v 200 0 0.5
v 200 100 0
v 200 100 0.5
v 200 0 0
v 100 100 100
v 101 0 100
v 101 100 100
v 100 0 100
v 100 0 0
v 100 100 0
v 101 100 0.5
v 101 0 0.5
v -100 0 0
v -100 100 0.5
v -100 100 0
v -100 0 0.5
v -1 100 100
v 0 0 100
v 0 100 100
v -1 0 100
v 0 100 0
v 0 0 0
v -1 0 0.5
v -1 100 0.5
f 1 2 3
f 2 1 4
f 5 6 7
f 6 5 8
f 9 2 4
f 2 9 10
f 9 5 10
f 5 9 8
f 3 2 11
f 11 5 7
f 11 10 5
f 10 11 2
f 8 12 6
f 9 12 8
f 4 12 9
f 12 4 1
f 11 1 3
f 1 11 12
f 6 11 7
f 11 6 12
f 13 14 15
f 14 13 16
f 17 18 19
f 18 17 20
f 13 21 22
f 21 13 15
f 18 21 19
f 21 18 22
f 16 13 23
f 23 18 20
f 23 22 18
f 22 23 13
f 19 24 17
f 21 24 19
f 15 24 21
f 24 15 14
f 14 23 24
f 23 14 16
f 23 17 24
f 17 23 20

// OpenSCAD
$fn = 12;


//lenght
l = 100;     
//width
w = 100;        
//height
h = 100;

module toto() {
}

ep_bord = 2;
ep_fon = 0.5;



translate([l,0,0])
    right(l,w,h,0);

translate([0,w,0])
    rotate([0,0,180])
        left(l,w,h,0);




module right (length,width,height) {
    
    difference() {
        cube([length,width,height]);
        translate([ep_bord/2,0,ep_fon])
        cube([width+5,length-ep_bord+5,height - ep_fon]);
    }
    
    
}

module left (length,width,height) {
    
        difference() {
        cube([length,width,height]);
        translate([ep_bord/2,0,ep_fon])
        cube([width+5,length-ep_bord+5,height - ep_fon]);
    }
    
    
}
